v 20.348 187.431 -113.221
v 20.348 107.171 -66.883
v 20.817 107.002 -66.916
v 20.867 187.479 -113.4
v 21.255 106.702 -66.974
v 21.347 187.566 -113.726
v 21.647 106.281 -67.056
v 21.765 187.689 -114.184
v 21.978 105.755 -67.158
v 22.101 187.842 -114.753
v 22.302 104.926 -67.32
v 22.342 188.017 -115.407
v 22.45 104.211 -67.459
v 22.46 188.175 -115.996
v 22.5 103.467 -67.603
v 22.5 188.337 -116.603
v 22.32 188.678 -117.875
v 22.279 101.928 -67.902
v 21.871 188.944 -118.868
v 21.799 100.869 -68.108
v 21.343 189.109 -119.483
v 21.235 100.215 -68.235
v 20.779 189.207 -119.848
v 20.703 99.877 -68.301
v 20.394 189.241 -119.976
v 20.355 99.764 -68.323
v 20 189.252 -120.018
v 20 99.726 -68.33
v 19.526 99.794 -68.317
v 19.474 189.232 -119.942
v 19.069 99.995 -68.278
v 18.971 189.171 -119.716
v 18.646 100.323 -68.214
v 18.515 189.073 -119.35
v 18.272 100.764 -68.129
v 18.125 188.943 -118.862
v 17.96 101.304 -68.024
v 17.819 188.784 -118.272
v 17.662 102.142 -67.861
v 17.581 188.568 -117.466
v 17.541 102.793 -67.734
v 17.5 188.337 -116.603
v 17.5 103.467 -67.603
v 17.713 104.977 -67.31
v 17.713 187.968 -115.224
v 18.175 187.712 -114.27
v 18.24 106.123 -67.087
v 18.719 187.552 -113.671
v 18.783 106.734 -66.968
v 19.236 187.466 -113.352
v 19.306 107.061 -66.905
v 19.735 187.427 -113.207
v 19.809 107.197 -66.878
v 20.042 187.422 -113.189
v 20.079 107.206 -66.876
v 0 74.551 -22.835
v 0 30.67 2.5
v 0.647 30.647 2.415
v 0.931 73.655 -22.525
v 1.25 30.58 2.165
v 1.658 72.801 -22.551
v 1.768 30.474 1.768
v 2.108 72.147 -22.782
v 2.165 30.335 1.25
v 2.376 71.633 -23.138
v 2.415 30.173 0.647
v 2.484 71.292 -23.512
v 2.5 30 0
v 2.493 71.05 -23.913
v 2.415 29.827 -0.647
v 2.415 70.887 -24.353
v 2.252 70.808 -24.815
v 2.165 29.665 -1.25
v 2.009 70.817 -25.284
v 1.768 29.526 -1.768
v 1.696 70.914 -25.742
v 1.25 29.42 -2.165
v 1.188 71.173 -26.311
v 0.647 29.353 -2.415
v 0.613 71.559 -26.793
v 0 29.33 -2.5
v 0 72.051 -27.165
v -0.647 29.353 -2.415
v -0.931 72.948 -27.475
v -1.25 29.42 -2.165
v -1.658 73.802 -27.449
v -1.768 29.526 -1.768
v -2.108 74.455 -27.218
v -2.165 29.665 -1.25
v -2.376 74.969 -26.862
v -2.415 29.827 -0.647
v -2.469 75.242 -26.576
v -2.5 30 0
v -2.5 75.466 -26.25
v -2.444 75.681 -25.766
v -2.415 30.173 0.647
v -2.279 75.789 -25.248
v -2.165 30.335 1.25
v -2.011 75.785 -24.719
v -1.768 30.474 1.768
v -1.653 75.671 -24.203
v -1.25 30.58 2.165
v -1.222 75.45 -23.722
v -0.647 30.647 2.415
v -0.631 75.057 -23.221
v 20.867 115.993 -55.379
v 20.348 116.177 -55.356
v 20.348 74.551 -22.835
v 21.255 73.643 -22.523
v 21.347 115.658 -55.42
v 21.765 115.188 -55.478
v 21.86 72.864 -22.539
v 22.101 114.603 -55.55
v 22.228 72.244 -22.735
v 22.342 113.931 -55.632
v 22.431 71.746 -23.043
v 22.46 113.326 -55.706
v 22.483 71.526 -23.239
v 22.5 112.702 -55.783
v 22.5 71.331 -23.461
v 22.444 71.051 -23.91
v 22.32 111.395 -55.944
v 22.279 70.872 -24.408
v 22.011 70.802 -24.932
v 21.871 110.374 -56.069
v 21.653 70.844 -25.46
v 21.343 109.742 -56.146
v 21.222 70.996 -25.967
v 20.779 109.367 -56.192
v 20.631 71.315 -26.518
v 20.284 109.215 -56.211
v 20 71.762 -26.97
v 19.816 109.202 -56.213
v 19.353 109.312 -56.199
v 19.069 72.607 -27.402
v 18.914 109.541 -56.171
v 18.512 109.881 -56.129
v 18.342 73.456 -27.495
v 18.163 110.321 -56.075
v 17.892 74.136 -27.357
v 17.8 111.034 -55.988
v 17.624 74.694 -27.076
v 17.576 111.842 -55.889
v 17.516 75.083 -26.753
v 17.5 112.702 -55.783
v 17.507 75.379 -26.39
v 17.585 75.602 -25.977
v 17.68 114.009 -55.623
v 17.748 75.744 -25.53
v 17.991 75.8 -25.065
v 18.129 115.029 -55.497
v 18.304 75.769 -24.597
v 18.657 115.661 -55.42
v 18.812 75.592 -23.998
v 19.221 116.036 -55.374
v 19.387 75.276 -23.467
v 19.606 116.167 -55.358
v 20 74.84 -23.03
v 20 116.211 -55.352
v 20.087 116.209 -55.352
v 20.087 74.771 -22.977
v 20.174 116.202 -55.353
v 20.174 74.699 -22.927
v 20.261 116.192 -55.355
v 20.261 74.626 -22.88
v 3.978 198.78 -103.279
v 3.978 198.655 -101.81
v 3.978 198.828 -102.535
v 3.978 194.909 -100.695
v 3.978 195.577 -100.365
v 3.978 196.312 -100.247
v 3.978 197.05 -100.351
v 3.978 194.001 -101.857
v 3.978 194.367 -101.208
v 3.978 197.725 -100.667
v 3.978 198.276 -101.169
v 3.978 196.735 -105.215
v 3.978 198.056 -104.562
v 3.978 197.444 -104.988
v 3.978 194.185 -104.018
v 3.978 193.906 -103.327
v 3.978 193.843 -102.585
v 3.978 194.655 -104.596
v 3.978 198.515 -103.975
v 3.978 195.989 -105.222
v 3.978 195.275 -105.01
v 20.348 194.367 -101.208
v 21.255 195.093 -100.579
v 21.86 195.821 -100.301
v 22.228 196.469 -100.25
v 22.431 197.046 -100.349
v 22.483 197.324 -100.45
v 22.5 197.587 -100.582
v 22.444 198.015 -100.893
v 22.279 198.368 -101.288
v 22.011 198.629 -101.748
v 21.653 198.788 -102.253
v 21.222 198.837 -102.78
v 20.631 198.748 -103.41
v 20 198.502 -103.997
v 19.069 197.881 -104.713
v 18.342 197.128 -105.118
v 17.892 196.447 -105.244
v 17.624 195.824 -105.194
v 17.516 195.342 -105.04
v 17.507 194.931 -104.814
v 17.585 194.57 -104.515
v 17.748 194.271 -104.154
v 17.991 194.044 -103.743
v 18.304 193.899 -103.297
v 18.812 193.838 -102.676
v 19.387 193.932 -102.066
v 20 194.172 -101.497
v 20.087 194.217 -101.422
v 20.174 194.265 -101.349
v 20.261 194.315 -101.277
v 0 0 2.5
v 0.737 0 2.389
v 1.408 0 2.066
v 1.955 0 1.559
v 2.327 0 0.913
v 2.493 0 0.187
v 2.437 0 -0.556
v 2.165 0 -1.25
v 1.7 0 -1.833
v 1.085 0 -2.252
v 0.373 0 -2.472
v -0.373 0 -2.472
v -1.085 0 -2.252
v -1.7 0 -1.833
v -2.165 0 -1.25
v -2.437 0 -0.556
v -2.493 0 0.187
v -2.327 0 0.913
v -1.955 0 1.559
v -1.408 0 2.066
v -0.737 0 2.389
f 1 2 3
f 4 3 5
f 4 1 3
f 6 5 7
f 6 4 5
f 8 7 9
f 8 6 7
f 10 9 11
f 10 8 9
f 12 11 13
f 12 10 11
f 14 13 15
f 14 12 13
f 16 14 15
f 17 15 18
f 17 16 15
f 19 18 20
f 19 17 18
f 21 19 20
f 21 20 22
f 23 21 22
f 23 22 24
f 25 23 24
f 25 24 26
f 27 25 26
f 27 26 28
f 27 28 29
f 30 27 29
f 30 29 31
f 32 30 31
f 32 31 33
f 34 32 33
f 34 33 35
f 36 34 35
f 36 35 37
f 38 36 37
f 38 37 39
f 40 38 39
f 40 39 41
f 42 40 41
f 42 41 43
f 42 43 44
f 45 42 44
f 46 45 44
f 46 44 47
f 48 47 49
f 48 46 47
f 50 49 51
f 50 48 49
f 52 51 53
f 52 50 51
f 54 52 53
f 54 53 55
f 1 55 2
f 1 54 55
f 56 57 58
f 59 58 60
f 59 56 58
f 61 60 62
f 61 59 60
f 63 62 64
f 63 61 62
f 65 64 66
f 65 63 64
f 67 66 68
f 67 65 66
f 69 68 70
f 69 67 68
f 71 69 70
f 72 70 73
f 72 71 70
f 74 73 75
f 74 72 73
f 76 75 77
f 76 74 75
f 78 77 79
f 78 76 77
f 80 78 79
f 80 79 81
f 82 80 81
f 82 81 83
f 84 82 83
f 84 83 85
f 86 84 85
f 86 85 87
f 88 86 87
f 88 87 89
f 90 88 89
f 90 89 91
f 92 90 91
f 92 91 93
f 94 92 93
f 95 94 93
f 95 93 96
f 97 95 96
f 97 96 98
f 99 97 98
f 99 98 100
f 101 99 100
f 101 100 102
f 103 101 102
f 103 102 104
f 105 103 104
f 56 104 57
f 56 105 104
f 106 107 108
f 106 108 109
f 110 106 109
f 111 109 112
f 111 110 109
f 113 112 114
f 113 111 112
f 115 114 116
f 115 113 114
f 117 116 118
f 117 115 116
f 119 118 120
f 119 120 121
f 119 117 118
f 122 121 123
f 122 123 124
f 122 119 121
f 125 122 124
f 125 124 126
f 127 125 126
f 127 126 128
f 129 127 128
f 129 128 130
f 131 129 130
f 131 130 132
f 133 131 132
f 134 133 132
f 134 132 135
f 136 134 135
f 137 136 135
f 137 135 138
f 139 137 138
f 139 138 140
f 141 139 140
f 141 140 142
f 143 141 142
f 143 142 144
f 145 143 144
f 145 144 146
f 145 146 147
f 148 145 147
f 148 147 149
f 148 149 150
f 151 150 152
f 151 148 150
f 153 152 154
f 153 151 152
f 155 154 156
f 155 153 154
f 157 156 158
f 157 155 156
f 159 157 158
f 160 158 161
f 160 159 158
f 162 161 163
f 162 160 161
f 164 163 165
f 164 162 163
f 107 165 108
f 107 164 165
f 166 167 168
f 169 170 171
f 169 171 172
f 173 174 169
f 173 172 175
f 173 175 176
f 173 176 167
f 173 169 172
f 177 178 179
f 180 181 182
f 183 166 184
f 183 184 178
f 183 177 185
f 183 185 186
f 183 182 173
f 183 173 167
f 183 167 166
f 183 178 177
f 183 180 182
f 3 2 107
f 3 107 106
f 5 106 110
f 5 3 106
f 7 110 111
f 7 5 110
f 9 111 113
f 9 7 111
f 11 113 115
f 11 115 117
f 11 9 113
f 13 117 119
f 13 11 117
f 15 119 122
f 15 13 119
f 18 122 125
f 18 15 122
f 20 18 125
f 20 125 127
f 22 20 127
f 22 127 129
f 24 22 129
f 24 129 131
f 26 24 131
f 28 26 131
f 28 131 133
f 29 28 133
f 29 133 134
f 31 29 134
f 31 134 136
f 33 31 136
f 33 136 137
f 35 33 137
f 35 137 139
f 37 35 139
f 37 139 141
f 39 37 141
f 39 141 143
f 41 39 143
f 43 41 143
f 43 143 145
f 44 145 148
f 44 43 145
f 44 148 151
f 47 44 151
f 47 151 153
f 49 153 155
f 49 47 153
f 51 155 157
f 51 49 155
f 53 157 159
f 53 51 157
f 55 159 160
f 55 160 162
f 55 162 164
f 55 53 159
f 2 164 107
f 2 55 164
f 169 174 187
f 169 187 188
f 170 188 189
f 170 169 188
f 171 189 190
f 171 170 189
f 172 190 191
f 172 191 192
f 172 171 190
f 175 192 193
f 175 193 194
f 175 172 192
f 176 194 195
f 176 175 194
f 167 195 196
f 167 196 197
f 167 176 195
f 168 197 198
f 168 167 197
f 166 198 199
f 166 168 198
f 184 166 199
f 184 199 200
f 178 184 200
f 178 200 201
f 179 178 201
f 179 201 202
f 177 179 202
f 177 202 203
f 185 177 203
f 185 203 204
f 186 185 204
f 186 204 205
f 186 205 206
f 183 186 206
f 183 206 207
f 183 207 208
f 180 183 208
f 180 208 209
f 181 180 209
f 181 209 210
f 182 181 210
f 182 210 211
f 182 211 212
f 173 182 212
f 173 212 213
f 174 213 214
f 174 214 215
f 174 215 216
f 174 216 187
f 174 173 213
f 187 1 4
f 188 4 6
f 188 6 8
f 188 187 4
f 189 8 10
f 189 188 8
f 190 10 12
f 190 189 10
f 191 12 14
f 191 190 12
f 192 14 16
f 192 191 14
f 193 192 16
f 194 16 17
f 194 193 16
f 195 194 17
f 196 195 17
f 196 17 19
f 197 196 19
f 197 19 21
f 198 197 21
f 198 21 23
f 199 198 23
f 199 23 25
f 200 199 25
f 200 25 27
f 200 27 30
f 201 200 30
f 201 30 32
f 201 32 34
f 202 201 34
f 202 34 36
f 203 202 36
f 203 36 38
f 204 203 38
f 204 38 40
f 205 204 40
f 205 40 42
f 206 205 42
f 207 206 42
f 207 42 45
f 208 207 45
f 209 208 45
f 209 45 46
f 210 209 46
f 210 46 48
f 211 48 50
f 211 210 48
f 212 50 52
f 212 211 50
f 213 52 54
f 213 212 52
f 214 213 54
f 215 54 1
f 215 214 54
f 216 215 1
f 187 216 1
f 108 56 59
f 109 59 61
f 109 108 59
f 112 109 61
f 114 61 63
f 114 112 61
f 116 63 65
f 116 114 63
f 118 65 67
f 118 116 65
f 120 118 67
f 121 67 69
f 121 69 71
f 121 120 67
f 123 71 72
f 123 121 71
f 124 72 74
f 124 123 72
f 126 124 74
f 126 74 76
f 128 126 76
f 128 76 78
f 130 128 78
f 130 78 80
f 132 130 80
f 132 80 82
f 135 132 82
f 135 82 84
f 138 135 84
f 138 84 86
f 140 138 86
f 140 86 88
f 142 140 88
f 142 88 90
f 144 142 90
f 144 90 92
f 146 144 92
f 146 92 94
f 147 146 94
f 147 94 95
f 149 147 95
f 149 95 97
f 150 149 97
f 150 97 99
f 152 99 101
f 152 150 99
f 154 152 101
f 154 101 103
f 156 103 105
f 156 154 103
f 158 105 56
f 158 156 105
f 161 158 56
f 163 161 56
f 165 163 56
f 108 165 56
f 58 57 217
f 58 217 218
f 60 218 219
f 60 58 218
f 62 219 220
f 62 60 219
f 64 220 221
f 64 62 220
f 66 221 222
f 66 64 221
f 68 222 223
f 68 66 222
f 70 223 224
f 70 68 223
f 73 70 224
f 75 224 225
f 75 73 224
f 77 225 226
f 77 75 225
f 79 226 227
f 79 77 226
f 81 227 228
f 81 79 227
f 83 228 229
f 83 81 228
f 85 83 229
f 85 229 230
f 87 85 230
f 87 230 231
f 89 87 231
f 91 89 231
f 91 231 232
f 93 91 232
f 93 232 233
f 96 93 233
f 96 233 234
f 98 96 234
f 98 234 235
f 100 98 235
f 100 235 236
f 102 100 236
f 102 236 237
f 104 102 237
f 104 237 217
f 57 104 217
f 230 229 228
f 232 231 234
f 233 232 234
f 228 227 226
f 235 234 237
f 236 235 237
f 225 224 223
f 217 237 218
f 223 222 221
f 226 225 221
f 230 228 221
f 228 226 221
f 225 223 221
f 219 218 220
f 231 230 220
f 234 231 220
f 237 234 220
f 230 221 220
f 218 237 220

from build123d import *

# Parameters (mm, degrees)
SWEEP1_PROFILE_R = 2.5


with BuildPart() as part:
    # Sweep1: sweep along a curve in space
    with BuildLine() as sweep1_path:
        Line((0, 0, 0), (0, 30, 0))
        Line((0, 30, 0), (0, 73.301270189, -25))
        Line((0, 73.301270189, -25), (20, 73.301270189, -25))
        Line((20, 73.301270189, -25), (20, 112.70180787, -55.783073766))
        Line((20, 112.70180787, -55.783073766), (20, 103.46688574, -67.60323507))
        Line((20, 103.46688574, -67.60323507), (20, 188.337375311, -116.60323507))
        Line((20, 188.337375311, -116.60323507), (20, 196.337375311, -102.74682861))
        Line((20, 196.337375311, -102.74682861), (3.978461048, 196.337375311, -102.74682861))
    # Sweep1 profile (on start of the path) → Sweep1 (sweep)
    with BuildSketch(Plane.ZX):
        Circle(SWEEP1_PROFILE_R)
    sweep(path=sweep1_path.line, transition=Transition.RIGHT)


solid = part.part
